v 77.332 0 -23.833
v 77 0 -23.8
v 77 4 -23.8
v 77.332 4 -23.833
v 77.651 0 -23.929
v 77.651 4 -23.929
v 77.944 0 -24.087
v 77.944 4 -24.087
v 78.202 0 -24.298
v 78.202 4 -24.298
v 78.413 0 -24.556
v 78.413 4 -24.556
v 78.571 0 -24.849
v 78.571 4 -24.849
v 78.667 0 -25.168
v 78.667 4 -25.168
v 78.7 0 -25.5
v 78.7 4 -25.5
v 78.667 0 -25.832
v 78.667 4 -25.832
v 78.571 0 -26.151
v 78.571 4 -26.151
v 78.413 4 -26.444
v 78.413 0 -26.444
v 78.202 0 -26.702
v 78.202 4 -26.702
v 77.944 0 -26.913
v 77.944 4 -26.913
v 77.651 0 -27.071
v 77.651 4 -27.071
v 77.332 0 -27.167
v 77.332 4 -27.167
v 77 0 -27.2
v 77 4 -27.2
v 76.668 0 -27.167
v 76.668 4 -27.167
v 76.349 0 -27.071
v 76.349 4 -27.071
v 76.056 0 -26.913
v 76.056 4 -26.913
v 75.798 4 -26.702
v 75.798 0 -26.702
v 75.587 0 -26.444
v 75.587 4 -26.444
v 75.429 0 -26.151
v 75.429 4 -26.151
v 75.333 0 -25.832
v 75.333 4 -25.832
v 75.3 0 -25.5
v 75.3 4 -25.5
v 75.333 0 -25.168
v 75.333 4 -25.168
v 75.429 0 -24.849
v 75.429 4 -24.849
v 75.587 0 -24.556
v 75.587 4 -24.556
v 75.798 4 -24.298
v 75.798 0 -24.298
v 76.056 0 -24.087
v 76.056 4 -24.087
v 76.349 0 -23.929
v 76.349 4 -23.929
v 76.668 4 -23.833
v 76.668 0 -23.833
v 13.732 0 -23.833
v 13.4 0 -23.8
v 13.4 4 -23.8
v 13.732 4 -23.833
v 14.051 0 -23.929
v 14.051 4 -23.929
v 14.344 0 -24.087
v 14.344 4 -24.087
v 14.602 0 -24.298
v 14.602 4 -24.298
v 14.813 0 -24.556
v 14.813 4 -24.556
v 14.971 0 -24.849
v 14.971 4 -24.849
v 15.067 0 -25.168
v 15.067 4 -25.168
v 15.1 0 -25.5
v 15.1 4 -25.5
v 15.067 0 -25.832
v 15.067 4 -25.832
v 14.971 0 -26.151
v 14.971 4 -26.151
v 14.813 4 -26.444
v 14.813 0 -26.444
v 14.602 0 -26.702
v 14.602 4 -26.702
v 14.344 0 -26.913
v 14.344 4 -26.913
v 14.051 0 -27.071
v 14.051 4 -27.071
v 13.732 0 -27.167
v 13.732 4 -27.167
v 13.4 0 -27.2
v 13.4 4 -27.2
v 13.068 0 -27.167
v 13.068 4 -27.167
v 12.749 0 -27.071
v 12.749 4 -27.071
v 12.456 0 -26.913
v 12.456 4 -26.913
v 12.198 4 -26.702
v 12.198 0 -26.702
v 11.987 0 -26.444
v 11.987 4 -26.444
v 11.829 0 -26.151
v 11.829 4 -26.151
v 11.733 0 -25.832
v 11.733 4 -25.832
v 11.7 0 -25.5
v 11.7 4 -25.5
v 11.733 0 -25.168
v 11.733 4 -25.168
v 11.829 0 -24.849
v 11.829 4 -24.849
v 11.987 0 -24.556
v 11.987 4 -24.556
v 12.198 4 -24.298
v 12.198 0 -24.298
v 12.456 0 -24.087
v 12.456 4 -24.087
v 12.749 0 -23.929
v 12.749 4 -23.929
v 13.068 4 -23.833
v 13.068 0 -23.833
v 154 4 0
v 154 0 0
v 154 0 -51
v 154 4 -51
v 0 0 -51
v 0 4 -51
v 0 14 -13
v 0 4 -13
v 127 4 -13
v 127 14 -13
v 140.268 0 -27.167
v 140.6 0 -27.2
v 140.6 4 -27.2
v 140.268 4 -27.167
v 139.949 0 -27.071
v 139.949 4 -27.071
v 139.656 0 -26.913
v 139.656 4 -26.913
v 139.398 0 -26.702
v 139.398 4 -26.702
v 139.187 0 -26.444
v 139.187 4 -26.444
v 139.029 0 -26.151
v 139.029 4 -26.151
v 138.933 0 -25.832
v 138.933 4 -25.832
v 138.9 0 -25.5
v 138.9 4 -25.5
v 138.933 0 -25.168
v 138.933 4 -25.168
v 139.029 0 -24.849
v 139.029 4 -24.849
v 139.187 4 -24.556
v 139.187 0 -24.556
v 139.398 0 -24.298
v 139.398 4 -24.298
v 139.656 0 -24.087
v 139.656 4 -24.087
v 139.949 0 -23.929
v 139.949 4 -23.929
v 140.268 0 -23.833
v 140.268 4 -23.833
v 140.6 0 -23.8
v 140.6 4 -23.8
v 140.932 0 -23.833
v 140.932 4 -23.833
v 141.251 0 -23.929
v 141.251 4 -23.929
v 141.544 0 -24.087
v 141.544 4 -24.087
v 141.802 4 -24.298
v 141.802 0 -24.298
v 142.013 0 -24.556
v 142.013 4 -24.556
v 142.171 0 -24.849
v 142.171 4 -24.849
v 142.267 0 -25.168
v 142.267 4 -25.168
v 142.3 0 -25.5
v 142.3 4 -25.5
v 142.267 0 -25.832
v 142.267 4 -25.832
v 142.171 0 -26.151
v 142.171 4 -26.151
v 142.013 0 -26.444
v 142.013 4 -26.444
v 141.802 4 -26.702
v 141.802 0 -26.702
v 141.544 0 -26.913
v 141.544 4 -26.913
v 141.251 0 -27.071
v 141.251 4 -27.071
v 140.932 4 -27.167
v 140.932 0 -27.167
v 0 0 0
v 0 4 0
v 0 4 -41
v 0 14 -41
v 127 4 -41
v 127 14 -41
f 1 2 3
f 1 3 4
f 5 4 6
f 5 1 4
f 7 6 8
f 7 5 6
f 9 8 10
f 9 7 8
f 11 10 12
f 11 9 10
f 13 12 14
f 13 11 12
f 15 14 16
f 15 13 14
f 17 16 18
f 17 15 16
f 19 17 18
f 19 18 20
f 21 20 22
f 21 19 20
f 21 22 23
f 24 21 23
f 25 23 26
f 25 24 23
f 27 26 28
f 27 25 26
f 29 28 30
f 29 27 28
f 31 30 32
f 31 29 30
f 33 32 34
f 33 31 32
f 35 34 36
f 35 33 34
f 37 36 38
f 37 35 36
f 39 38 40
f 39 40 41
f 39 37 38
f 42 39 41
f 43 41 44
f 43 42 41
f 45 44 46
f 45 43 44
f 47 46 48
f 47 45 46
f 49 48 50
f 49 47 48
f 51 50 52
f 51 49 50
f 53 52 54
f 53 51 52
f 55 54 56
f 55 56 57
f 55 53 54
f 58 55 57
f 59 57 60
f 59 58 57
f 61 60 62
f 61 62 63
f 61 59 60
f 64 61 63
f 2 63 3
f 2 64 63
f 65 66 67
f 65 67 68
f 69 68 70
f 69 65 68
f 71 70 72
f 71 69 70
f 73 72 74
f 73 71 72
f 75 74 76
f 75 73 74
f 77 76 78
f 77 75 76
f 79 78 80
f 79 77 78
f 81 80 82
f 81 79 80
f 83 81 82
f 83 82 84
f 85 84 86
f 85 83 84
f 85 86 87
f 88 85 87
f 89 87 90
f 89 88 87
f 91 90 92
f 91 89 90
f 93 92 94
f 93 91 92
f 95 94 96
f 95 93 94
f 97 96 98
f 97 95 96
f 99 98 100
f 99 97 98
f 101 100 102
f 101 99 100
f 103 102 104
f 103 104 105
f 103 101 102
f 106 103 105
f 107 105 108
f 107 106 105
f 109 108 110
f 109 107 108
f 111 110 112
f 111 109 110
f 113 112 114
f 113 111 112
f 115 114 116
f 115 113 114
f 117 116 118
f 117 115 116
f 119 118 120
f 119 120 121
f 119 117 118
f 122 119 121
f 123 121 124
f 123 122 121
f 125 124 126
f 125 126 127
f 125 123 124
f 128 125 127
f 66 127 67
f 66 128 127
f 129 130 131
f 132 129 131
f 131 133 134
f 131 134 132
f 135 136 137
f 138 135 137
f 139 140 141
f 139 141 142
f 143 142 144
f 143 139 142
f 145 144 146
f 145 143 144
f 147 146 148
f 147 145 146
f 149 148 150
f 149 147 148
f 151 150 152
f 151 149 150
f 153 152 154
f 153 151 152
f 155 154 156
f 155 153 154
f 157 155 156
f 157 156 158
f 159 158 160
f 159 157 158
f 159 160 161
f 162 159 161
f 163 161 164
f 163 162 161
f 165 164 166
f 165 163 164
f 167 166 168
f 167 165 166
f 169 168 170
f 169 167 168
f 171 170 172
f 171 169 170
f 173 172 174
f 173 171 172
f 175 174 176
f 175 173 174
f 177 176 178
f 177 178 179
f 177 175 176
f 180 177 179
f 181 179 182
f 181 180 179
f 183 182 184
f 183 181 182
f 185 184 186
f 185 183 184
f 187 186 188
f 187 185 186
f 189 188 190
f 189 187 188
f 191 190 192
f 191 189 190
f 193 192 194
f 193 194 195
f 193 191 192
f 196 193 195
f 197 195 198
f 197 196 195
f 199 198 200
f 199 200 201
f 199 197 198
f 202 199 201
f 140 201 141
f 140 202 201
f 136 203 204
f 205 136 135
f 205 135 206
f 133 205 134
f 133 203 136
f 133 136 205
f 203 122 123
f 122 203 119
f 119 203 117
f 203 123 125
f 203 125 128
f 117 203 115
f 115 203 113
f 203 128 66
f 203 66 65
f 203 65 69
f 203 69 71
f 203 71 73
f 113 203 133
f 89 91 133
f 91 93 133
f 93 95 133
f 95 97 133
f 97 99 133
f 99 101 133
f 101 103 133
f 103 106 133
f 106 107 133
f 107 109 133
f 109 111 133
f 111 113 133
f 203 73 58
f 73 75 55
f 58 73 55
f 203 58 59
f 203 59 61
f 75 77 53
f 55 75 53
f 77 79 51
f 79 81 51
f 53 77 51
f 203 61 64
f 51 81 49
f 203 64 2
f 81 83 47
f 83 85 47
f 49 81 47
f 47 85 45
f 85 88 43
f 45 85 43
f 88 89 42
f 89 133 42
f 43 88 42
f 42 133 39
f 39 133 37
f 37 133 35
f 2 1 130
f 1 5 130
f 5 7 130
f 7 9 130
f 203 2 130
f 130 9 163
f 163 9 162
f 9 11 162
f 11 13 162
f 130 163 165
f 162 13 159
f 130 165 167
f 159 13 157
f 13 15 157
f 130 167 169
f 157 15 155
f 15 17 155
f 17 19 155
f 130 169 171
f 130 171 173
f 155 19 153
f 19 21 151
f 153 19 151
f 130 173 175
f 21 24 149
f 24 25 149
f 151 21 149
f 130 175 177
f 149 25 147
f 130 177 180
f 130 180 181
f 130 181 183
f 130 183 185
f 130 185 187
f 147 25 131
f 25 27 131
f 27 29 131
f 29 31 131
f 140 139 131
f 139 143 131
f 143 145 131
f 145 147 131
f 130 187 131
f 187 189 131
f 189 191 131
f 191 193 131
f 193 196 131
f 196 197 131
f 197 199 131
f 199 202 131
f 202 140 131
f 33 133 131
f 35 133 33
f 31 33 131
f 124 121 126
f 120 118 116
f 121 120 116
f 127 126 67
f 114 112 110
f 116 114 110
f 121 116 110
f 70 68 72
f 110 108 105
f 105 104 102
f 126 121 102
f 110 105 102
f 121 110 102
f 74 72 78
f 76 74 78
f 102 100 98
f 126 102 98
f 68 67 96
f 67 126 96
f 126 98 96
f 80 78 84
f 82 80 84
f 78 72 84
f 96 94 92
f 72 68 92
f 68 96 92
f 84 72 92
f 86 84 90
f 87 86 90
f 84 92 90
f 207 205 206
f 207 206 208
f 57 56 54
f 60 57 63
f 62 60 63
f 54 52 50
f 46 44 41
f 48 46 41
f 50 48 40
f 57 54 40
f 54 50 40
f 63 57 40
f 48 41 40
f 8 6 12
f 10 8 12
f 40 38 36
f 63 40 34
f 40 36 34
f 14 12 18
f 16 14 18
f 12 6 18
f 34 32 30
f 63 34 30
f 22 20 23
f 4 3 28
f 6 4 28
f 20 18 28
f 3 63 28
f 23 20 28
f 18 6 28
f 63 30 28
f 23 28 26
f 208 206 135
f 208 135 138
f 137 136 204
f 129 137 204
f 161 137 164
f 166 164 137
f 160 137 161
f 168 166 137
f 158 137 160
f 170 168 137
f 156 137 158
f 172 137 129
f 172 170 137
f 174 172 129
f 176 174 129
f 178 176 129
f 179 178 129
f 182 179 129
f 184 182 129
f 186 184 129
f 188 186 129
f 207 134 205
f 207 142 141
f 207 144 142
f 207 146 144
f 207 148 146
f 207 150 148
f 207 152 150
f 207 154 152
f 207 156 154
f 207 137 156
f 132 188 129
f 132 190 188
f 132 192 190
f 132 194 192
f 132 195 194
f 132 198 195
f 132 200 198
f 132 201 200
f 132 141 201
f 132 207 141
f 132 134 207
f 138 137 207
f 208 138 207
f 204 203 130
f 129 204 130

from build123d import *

# Parameters (mm, degrees)
SKETCH1_W           = 154
SKETCH1_H           = 51
SKETCH1_R           = 1.7
BOSS_EXTRUDE1_DEPTH = 4
SKETCH2_W           = 127
SKETCH2_H           = 28
BOSS_EXTRUDE2_DEPTH = 10


with BuildPart() as part:
    # Sketch1 → Boss-Extrude1 (new body)
    with BuildSketch(Plane(origin=(0, 0, 0), x_dir=(1, 0, 0), z_dir=(0, 1, 0))):
        with Locations((77, 25.5)):
            Rectangle(SKETCH1_W, SKETCH1_H)
        with Locations(Location((77, 25.5, 0), (0, 0, 270))):
            Circle(SKETCH1_R, mode=Mode.SUBTRACT)
        with Locations(Location((13.4, 25.5, 0), (0, 0, 270))):
            Circle(SKETCH1_R, mode=Mode.SUBTRACT)
        with Locations(Location((140.6, 25.5, 0), (0, 0, 90))):
            Circle(SKETCH1_R, mode=Mode.SUBTRACT)
    extrude(amount=BOSS_EXTRUDE1_DEPTH)

    # Sketch2 → Boss-Extrude2 (add)
    with BuildSketch(Plane(origin=(0, 4, 0), x_dir=(1, 0, 0), z_dir=(0, 1, 0))):
        with Locations((63.5, 27)):
            Rectangle(SKETCH2_W, SKETCH2_H)
    extrude(amount=BOSS_EXTRUDE2_DEPTH)


solid = part.part
